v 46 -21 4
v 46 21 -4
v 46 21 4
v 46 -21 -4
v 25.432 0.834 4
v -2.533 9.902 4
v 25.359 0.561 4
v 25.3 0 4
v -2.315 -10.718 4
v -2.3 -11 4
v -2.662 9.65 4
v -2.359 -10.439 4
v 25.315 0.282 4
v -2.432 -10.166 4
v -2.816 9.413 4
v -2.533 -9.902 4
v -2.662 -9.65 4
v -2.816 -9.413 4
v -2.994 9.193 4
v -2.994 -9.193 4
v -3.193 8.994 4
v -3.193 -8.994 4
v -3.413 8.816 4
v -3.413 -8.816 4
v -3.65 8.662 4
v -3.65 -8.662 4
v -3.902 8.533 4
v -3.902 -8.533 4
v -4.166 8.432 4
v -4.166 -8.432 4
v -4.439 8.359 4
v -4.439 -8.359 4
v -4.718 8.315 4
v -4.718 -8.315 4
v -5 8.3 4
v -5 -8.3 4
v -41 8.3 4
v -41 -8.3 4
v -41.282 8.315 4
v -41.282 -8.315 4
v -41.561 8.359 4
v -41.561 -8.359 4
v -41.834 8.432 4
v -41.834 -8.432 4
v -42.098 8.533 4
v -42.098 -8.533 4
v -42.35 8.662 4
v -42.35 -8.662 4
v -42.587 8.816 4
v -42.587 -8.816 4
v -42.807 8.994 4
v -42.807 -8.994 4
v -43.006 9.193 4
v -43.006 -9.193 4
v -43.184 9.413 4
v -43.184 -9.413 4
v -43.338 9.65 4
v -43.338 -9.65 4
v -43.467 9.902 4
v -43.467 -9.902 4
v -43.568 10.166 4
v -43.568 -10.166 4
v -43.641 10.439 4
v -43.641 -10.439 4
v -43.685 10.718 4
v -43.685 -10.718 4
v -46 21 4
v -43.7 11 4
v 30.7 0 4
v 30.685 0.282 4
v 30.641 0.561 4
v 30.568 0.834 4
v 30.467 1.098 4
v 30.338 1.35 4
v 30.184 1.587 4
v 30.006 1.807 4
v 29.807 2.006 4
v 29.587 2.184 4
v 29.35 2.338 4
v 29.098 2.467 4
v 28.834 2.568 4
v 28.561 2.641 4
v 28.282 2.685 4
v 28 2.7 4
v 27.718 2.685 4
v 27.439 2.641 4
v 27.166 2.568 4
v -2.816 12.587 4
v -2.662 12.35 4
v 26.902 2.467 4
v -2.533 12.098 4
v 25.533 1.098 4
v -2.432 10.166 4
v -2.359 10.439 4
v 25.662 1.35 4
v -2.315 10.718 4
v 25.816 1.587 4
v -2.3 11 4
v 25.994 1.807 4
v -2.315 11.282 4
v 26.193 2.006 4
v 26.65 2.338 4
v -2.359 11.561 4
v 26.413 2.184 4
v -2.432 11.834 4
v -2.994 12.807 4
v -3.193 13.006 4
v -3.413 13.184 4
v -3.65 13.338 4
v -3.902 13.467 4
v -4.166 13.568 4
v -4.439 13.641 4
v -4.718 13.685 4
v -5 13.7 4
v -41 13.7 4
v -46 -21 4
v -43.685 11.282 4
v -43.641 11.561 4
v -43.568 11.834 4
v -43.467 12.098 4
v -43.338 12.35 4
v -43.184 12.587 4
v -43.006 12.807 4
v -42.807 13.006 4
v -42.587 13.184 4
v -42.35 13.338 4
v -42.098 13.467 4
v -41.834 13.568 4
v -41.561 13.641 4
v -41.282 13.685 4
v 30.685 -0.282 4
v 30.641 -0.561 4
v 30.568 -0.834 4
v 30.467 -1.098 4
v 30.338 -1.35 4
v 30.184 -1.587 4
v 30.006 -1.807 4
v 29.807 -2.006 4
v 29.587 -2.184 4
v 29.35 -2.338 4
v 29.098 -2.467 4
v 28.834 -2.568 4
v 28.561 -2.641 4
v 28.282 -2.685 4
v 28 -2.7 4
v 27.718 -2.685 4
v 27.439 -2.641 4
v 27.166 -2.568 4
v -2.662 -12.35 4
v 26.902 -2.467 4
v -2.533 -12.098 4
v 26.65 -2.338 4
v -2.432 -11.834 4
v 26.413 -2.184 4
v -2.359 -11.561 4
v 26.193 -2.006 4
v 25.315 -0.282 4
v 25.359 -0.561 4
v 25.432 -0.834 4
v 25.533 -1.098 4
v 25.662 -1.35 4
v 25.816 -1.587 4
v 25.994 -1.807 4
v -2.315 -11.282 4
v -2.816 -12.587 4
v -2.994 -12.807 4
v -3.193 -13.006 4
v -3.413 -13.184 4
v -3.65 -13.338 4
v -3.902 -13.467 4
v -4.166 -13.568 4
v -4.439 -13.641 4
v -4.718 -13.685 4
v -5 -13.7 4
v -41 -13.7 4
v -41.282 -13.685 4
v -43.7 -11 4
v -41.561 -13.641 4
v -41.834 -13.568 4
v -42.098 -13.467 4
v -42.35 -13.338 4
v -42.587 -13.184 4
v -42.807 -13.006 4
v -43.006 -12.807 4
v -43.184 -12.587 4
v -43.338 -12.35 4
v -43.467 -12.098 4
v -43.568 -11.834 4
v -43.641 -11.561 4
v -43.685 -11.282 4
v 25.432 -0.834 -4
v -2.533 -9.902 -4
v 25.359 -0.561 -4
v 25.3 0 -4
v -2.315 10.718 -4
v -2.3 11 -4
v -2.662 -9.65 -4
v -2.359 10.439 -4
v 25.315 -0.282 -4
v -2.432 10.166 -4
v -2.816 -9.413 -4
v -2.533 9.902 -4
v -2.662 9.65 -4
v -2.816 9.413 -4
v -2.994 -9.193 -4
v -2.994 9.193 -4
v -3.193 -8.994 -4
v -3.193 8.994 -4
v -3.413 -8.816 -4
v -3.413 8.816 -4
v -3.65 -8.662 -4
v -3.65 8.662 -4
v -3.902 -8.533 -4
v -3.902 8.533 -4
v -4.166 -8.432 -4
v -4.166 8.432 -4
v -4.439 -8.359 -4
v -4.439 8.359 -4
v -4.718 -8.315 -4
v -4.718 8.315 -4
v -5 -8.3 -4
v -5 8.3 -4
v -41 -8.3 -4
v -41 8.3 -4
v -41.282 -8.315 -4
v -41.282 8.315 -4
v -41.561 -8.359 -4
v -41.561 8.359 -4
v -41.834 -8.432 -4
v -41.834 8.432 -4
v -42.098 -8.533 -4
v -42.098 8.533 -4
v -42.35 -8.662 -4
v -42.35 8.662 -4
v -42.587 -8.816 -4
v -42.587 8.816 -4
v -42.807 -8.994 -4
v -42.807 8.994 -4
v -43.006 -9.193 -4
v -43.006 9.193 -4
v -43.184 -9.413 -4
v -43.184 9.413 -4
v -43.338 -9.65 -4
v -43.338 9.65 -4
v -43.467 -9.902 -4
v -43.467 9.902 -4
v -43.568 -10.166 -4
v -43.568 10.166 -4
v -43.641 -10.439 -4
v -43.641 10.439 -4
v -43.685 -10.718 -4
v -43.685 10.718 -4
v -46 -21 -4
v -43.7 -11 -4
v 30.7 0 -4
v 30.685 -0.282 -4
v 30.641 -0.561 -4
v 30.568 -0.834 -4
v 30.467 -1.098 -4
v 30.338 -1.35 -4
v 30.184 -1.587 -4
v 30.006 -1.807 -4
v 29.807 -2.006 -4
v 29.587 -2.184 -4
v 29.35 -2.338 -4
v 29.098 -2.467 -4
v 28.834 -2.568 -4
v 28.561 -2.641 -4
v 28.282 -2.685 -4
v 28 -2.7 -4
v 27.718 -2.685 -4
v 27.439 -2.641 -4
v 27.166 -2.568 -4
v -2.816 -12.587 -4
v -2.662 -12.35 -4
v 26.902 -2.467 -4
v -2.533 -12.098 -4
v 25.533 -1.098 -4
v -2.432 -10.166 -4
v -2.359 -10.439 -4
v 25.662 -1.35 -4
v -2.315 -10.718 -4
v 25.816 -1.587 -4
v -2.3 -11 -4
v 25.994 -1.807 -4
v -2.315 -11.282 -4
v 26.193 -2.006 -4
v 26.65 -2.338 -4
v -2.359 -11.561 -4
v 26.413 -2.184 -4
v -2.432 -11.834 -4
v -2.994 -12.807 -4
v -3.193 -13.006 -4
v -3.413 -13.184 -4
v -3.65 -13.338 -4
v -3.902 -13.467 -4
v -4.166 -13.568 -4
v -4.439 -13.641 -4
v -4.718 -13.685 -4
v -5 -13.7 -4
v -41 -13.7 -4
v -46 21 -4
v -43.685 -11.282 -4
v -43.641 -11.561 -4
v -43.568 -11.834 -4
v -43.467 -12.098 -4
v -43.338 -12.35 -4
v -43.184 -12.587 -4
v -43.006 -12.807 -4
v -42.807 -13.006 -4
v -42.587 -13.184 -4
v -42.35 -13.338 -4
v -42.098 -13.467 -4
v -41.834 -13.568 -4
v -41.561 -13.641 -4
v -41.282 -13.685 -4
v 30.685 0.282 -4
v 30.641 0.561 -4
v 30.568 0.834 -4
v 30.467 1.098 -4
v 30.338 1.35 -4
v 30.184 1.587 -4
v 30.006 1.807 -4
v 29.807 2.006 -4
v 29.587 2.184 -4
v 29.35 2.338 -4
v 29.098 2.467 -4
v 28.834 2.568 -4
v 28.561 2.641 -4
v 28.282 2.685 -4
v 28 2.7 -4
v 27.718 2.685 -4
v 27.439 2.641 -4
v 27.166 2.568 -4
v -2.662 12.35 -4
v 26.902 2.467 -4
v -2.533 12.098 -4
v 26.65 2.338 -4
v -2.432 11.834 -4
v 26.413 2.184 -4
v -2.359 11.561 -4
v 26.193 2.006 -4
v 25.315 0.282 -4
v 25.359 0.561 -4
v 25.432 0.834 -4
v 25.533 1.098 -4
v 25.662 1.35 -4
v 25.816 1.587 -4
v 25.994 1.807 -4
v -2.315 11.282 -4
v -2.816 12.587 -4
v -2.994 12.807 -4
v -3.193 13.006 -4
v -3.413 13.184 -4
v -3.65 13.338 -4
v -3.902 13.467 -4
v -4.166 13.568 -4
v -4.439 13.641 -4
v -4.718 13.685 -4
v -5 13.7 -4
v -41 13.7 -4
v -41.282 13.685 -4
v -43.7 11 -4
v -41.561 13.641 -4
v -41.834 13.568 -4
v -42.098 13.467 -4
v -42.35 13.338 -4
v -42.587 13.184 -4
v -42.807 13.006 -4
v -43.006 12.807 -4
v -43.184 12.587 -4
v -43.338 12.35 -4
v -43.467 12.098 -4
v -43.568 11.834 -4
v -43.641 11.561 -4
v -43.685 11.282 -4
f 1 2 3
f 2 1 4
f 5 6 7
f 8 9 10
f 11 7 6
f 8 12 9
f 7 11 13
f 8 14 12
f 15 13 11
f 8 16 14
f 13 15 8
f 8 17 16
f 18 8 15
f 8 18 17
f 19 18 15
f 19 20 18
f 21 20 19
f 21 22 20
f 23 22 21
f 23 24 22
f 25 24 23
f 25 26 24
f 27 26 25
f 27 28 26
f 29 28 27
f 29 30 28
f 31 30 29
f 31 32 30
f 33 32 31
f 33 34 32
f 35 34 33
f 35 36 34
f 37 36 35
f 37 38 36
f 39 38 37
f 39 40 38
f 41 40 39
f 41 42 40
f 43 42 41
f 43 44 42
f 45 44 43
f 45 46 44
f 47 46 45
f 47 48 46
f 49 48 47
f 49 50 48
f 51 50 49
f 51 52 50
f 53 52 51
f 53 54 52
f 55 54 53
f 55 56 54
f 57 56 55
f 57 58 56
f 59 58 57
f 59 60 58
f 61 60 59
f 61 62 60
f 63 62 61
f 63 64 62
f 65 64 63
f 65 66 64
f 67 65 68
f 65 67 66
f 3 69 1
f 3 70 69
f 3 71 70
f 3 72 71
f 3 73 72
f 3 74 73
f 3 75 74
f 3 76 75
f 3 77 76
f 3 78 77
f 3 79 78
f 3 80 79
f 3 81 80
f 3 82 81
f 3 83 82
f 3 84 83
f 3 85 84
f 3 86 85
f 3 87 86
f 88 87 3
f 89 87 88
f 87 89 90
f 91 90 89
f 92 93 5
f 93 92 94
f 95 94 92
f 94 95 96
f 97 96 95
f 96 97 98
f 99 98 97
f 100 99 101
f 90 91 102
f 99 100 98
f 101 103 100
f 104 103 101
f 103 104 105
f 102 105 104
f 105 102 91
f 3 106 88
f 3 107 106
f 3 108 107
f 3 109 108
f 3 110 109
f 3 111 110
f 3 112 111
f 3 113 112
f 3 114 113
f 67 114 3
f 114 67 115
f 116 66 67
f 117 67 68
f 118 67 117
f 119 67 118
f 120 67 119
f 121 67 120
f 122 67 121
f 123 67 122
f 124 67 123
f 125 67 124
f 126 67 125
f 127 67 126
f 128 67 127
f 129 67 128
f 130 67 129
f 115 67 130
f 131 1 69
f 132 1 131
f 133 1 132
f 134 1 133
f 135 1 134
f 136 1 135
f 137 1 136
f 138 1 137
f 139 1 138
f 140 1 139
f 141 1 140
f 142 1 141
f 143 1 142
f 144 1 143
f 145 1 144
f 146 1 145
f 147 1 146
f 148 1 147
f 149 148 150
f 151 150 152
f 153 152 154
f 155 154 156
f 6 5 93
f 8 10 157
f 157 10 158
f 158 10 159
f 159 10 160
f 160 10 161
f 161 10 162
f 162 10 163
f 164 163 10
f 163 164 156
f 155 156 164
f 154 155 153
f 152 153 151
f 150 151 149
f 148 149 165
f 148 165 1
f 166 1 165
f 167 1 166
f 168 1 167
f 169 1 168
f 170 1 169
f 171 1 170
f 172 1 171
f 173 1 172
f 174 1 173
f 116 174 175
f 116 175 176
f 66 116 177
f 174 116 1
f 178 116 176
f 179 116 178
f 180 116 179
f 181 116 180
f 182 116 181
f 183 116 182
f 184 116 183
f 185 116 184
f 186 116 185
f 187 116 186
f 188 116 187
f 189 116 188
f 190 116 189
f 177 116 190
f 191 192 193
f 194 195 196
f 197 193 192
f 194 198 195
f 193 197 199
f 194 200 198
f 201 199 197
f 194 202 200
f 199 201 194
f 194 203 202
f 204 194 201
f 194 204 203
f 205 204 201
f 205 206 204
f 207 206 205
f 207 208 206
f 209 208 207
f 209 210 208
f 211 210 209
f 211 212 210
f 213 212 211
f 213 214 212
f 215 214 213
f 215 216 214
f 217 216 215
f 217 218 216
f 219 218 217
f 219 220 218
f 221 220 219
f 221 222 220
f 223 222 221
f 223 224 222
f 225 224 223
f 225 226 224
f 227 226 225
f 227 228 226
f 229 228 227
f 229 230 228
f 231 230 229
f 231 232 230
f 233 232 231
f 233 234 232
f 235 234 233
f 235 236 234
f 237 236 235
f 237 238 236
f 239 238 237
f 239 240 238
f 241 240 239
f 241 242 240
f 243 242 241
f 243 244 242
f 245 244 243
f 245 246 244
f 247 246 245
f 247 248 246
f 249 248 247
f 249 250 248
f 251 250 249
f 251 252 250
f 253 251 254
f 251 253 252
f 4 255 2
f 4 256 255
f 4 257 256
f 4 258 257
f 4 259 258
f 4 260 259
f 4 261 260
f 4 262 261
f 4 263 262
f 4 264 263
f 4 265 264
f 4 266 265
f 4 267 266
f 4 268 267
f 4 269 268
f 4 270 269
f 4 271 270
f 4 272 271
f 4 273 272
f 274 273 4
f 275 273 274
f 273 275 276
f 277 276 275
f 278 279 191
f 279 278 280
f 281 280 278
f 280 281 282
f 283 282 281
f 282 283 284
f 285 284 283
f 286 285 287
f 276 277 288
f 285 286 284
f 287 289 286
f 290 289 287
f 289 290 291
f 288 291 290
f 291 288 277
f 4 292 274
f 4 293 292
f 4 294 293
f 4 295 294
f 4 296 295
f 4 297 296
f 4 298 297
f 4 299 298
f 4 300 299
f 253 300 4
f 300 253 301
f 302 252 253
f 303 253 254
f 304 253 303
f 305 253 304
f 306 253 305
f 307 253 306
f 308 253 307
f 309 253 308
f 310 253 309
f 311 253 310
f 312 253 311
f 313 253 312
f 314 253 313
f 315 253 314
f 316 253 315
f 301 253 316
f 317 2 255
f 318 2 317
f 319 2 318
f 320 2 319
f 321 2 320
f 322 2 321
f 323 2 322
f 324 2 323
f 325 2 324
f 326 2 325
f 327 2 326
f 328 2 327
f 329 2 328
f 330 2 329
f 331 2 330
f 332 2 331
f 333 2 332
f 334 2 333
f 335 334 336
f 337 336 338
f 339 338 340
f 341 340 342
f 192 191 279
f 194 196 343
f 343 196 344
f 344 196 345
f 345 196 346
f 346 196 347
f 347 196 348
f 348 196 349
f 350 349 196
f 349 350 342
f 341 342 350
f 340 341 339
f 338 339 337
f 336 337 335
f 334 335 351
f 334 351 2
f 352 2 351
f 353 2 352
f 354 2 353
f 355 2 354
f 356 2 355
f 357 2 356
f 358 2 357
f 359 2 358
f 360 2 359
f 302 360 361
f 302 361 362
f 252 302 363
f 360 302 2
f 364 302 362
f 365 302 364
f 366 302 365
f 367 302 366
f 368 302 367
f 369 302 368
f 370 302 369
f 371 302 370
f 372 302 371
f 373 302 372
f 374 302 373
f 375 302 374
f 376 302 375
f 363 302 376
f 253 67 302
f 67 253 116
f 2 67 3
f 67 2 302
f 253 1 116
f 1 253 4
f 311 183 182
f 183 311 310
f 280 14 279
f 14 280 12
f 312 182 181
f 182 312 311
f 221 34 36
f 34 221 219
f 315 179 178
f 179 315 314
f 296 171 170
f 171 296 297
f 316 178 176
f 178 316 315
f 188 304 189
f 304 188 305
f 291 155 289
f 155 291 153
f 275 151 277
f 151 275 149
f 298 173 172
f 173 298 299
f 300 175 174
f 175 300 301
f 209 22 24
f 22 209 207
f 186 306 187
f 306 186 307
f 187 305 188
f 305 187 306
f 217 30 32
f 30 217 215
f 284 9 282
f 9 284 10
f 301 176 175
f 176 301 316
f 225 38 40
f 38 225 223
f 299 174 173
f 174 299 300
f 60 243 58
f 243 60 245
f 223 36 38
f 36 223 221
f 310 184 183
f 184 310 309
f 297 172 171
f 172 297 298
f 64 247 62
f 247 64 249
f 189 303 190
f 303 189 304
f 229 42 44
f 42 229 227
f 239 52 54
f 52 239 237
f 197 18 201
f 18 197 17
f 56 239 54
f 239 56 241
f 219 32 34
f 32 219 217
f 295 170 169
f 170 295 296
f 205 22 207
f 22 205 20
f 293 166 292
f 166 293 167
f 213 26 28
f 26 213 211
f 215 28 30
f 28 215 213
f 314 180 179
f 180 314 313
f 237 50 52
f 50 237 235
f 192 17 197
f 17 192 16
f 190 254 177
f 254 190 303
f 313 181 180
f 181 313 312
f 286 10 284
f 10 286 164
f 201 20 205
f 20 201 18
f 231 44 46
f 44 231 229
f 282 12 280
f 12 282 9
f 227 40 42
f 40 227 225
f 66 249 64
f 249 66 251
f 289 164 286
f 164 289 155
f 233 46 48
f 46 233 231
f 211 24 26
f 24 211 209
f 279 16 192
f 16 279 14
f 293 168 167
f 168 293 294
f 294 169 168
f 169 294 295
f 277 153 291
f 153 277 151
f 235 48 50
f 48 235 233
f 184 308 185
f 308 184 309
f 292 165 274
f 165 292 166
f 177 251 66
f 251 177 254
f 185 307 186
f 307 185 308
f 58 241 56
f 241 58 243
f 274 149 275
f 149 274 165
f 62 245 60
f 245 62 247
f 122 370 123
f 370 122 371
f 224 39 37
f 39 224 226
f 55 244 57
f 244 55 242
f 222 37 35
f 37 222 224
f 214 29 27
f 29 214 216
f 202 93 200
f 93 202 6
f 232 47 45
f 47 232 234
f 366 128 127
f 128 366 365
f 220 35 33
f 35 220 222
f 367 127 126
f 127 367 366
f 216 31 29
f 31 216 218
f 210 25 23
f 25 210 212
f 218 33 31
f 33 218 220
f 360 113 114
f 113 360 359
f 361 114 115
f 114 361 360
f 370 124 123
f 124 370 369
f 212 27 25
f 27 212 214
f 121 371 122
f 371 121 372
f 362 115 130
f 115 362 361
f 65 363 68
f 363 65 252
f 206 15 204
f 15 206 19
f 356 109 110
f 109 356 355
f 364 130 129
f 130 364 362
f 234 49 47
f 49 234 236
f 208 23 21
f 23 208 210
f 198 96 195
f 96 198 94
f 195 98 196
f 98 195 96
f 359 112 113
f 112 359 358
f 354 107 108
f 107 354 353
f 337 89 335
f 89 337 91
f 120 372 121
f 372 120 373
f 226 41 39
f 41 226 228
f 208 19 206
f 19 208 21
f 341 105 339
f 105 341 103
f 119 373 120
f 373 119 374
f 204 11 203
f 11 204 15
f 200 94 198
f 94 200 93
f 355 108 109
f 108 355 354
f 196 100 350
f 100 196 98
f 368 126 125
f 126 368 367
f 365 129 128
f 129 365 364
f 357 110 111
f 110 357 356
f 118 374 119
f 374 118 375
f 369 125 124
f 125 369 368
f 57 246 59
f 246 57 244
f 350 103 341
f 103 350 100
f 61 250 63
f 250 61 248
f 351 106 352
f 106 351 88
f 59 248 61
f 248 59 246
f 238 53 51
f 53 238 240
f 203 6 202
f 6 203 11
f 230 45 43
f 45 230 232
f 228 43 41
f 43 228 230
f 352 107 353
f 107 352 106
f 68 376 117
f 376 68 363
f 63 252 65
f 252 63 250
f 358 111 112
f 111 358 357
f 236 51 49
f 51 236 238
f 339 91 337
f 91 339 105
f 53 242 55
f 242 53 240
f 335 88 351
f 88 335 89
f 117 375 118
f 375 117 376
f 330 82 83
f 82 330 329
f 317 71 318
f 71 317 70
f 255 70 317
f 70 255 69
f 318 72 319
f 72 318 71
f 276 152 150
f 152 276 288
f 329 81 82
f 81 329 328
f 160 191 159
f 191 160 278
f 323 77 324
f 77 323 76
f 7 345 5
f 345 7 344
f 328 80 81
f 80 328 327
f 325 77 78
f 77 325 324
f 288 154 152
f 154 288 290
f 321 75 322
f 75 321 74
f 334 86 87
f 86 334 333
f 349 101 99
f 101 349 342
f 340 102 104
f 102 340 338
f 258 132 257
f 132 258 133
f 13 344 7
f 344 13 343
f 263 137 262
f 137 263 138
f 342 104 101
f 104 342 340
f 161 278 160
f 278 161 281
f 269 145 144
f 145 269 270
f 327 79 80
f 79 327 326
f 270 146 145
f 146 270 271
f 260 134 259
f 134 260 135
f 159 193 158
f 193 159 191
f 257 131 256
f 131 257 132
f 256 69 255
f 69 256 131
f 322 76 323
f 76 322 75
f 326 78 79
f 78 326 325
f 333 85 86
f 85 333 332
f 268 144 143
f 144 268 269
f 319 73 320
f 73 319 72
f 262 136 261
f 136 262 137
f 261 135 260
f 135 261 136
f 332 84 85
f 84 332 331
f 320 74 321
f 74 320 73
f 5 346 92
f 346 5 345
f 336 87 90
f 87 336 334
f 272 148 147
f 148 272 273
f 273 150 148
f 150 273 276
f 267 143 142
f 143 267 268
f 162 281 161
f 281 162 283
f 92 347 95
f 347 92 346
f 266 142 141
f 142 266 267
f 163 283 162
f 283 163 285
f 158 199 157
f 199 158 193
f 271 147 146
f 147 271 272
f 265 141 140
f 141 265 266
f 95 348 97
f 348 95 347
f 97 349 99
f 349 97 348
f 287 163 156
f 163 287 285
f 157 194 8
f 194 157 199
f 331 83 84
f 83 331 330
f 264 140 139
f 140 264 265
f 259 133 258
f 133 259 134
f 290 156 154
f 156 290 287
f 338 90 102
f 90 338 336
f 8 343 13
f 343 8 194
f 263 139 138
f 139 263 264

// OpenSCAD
// GT2 idler tensioner slide for 9 mm belt.
$fn = 60;
eps = 0.02;
slide_l = 92;
slide_w = 42;
slide_t = 8;
belt_w = 9;
slot_l = 36;
axle_d = 5.4;
axle_x = slide_l / 2 - 18;
module slot(y) {
    hull() {
        translate([-slide_l / 4 - slot_l / 2, y, -slide_t / 2 - eps]) cylinder(d = 5.4, h = slide_t + 2 * eps);
        translate([-slide_l / 4 + slot_l / 2, y, -slide_t / 2 - eps]) cylinder(d = 5.4, h = slide_t + 2 * eps);
    }
}
difference() {
    cube([slide_l, slide_w, slide_t], center = true);
    slot(-11);
    slot(11);
    translate([axle_x, 0, -slide_t / 2 - eps]) cylinder(d = axle_d, h = slide_t + 2 * eps);
}
